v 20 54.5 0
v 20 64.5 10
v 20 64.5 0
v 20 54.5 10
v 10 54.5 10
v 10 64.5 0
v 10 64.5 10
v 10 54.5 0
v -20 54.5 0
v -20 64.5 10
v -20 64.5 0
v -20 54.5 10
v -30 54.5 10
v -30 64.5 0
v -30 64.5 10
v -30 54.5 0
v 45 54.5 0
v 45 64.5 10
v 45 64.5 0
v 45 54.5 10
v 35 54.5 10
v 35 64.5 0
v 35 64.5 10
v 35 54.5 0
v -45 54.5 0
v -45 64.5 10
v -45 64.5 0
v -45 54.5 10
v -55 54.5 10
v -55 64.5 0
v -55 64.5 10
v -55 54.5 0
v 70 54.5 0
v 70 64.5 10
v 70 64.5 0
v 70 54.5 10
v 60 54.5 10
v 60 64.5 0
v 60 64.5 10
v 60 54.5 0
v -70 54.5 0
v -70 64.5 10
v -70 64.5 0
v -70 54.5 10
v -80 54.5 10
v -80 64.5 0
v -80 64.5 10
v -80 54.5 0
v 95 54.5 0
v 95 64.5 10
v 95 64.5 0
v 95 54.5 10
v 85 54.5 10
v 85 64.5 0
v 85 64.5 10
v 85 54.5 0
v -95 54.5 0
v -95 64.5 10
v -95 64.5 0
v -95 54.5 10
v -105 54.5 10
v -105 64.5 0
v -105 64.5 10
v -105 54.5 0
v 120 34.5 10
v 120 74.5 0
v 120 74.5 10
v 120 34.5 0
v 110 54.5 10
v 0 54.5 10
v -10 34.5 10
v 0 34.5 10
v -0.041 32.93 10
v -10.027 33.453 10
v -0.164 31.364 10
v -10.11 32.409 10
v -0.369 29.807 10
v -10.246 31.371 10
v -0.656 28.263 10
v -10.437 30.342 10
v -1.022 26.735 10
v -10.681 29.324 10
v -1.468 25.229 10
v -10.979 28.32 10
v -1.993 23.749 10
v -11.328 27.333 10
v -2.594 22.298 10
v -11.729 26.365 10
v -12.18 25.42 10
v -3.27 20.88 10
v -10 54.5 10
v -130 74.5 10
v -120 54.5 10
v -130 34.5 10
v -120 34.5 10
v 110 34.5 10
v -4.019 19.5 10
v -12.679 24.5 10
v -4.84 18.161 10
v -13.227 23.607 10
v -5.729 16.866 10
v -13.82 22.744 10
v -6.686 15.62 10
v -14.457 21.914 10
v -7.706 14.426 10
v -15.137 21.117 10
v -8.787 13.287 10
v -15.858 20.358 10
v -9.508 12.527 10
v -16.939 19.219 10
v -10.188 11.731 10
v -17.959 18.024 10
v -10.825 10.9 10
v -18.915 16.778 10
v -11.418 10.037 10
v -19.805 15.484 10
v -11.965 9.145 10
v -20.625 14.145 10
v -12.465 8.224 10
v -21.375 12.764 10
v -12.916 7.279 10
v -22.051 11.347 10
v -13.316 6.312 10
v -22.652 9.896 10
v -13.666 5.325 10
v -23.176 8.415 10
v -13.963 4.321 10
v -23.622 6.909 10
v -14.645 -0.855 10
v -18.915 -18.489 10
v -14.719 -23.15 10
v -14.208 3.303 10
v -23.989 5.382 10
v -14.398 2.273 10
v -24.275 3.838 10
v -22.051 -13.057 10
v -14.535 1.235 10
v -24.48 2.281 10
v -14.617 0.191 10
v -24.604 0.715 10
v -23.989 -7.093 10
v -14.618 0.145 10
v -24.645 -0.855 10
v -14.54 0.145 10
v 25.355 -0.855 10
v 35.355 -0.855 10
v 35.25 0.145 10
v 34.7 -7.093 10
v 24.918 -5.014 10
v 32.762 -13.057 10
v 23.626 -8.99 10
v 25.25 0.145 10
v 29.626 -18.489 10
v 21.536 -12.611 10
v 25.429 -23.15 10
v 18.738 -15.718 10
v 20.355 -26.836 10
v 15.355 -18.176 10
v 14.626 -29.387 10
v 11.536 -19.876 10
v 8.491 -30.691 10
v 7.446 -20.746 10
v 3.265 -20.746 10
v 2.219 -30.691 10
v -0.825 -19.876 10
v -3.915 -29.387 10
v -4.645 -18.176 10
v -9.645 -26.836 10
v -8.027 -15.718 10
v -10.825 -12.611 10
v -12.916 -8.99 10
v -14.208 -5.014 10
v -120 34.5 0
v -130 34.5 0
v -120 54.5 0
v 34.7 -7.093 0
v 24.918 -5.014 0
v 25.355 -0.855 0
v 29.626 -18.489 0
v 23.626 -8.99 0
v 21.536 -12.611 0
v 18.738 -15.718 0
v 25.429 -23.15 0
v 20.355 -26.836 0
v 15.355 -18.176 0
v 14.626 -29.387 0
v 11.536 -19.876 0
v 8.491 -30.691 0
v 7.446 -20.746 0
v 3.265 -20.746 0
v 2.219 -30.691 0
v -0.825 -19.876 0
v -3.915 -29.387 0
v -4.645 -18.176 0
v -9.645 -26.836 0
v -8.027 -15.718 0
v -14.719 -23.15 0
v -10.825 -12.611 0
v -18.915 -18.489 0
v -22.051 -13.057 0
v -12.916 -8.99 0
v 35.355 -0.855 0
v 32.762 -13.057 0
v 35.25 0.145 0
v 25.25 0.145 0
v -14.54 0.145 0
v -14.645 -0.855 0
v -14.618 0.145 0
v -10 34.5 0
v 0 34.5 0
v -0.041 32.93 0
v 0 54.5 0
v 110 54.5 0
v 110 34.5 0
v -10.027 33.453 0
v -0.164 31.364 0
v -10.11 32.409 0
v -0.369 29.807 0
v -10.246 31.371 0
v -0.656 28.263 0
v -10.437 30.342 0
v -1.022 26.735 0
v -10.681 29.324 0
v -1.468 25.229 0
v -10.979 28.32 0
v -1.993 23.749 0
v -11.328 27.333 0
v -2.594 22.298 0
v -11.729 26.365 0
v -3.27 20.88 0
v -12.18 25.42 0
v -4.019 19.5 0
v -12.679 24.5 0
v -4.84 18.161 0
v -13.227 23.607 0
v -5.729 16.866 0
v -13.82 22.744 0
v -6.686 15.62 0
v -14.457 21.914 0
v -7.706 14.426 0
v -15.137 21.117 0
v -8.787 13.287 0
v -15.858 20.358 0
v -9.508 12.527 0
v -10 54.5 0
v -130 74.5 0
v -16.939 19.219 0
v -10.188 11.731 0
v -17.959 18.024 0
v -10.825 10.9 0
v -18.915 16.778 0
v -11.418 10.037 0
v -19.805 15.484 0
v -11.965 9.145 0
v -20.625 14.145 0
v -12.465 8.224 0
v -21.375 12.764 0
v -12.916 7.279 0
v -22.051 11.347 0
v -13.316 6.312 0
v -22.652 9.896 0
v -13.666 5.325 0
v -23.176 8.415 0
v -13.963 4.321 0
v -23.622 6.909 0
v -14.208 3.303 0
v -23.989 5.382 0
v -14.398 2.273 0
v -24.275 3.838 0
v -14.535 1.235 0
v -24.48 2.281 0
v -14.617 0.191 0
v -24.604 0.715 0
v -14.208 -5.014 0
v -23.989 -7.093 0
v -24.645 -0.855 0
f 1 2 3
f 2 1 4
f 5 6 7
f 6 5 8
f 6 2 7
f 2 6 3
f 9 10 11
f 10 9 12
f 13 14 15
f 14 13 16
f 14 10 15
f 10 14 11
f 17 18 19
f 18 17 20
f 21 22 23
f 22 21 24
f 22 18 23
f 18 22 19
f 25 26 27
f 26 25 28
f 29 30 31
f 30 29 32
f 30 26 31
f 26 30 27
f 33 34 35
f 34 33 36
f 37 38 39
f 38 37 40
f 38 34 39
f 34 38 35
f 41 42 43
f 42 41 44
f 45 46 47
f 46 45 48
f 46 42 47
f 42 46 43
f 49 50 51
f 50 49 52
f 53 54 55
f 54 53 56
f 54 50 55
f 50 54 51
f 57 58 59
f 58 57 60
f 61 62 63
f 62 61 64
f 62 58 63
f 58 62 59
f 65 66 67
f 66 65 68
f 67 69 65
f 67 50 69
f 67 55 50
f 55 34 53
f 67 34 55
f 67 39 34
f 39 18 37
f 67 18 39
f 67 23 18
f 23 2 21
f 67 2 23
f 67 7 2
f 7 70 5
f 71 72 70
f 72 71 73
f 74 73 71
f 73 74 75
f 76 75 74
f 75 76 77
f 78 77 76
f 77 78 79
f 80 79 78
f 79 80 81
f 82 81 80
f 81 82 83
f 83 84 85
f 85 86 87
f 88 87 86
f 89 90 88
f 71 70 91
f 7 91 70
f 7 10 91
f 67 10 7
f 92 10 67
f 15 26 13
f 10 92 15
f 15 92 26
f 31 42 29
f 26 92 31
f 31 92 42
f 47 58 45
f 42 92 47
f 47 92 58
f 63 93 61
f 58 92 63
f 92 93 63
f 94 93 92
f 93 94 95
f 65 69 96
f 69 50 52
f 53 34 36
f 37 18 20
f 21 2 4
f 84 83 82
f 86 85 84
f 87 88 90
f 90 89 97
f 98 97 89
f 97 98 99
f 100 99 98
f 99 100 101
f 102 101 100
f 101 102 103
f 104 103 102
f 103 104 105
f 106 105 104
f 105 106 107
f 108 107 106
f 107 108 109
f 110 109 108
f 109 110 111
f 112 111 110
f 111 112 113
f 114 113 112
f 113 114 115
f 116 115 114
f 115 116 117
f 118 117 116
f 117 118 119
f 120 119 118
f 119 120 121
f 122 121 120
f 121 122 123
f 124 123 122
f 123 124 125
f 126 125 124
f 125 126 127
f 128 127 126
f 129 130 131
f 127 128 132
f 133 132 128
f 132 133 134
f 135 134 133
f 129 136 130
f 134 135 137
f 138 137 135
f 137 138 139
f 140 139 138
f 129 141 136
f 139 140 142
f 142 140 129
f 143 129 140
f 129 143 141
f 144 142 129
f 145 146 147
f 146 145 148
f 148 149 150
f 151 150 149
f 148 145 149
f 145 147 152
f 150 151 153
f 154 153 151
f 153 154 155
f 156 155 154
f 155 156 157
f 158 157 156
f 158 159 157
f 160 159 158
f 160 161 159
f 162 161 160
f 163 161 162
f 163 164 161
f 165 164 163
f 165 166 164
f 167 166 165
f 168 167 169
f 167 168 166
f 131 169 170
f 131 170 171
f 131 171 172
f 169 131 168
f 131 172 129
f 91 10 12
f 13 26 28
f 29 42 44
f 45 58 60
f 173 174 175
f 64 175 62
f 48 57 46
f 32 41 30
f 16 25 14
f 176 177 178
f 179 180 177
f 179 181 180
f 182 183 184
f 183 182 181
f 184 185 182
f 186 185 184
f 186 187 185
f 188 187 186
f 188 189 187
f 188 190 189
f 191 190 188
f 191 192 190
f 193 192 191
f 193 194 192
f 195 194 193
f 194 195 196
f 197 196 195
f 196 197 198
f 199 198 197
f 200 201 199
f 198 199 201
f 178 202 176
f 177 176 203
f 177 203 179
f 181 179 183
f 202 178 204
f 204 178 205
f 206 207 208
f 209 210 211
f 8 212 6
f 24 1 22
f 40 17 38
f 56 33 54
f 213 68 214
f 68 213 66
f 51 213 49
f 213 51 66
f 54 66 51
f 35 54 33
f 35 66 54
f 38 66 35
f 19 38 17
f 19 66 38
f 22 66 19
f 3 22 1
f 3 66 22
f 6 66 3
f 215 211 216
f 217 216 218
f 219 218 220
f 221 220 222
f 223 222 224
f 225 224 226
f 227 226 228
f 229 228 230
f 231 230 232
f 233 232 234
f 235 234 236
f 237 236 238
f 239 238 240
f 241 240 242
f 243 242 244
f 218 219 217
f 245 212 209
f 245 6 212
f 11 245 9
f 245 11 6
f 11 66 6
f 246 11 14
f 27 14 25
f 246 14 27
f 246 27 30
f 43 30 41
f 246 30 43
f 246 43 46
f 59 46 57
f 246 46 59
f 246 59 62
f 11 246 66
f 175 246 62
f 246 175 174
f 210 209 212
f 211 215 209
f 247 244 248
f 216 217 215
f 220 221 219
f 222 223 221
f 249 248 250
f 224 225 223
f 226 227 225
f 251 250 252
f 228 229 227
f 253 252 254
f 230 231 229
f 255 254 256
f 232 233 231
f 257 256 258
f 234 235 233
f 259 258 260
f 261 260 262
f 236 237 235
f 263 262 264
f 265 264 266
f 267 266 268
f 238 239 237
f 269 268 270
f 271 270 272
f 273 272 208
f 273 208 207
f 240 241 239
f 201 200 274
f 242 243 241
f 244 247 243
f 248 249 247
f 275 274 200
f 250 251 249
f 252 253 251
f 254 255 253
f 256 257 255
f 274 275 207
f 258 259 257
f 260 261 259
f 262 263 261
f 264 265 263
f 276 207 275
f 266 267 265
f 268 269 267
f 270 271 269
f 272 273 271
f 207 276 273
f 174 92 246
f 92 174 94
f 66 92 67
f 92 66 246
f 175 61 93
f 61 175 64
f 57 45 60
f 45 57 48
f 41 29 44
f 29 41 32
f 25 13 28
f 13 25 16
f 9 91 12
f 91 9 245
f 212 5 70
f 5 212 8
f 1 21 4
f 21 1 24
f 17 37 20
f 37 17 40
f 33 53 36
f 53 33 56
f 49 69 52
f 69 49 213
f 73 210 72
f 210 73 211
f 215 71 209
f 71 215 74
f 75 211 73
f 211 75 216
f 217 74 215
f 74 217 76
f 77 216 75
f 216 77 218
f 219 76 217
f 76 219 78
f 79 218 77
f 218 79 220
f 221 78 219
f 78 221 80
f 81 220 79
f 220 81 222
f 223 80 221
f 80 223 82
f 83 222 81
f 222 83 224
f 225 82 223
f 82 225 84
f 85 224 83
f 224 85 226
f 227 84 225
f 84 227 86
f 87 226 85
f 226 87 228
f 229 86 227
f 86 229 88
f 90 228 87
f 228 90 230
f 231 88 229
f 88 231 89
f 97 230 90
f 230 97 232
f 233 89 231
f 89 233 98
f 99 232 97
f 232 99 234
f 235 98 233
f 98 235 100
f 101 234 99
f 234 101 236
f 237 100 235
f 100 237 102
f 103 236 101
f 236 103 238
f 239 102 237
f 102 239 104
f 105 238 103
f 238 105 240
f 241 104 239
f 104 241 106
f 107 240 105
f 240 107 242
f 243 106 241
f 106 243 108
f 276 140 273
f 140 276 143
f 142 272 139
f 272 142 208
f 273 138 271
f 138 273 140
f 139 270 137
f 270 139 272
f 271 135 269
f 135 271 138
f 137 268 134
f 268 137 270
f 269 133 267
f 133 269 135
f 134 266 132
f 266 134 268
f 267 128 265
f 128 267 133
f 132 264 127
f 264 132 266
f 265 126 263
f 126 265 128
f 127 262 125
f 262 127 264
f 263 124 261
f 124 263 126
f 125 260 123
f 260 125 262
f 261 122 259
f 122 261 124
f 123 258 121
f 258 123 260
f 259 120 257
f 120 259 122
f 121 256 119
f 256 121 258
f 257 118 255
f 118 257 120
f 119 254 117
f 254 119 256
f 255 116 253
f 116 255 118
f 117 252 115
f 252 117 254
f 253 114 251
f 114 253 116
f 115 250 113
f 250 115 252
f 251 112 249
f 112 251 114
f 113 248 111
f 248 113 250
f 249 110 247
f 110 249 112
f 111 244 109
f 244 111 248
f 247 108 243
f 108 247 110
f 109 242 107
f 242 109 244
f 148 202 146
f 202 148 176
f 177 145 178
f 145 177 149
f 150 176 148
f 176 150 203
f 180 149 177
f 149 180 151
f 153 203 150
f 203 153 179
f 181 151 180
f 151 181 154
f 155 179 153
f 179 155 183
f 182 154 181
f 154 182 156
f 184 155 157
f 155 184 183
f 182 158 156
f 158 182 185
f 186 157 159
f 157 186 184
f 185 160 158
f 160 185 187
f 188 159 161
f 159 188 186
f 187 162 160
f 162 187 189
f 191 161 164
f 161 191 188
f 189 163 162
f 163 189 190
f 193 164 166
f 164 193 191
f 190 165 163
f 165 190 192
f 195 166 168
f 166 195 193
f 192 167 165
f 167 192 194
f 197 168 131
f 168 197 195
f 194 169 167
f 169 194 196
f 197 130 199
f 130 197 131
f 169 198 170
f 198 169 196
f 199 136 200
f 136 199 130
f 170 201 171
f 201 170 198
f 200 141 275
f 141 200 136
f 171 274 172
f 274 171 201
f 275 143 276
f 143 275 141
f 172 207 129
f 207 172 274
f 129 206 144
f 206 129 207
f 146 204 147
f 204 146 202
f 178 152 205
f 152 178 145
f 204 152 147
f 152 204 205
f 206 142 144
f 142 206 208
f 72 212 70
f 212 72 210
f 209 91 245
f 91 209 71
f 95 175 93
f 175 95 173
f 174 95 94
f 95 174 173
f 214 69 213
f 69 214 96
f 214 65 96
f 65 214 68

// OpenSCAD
// Hanger length in cm
hanger_length = 25 ;	// [15:35]

// Width bar/loop in mm
width_of_bar = 10  ;	// [5:15]

// rotate([0, 0, 45])
translate([-10 * hanger_length / 2 - width_of_bar / 2, 54.5, 0])
tie_hanger(hanger_length * 10, width_of_bar) ;

module tie_hanger(length, width) {
    gap = 15 ;	// gap between slots
    r = width / 2 ;
    s = sin(45) ;

    // The main bar
    difference() {
        cube(size=[length, width * 2, width]) ;
        for (i = [gap + r:gap + width:(length - width - gap) / 2]) {
            translate([length / 2 + i - r, -1, -1])
            cube(size=[width, width + 1, width + 2]) ;
            translate([length / 2 - i - r, -1, -1])
            cube(size=[width, width + 1, width + 2]) ;
        }
    }

    // tips on the end
    translate([0, -r * 4, 0]) cube(size=[width, width * 2, width]) ;
    translate([length - r * 2, -r * 4, 0]) cube(size=[width, width * 4, width]) ;

    // The center hanger part
    color("red")
    union() {
        translate([length / 2 - r, -20, 0]) cube(size=[width, 20, width]) ;
        translate([length / 2 - 20 - r, -20, 0]) rotate([0, 0, -90]) eigth(width) ;

        translate([length / 2 - 20 - r + (40 + width) * s,
                   -20 - (40 + width) * s, 0])
        rotate([0, 0, 90]) eigth(width) ;

        translate([length / 2 - 20  - r + (40 + width) * s,
                   -20 - 2 * (20 + r) * s, 0])
        rotate([0, 0, 180])
        intersection() {
            ring(width) ;
            translate([-21 - width, -1, -1])
            cube(size=[42 + 2 * width, 22 + width, width + 2]) ;
        }
    }
}

module eigth(w) {
    $fn = 120 ;
    r = 20 ;
    intersection() {
        ring(w, r) ;
        cube(size=[r + w, r + w, w + 2]) ;
        rotate([0, 0, 45]) cube(size=[r + w, r + w, w + 2]) ;
    }
}

module ring(w) {
    rotate_extrude() translate([20, 0, 0]) square([w, w]) ;
}
